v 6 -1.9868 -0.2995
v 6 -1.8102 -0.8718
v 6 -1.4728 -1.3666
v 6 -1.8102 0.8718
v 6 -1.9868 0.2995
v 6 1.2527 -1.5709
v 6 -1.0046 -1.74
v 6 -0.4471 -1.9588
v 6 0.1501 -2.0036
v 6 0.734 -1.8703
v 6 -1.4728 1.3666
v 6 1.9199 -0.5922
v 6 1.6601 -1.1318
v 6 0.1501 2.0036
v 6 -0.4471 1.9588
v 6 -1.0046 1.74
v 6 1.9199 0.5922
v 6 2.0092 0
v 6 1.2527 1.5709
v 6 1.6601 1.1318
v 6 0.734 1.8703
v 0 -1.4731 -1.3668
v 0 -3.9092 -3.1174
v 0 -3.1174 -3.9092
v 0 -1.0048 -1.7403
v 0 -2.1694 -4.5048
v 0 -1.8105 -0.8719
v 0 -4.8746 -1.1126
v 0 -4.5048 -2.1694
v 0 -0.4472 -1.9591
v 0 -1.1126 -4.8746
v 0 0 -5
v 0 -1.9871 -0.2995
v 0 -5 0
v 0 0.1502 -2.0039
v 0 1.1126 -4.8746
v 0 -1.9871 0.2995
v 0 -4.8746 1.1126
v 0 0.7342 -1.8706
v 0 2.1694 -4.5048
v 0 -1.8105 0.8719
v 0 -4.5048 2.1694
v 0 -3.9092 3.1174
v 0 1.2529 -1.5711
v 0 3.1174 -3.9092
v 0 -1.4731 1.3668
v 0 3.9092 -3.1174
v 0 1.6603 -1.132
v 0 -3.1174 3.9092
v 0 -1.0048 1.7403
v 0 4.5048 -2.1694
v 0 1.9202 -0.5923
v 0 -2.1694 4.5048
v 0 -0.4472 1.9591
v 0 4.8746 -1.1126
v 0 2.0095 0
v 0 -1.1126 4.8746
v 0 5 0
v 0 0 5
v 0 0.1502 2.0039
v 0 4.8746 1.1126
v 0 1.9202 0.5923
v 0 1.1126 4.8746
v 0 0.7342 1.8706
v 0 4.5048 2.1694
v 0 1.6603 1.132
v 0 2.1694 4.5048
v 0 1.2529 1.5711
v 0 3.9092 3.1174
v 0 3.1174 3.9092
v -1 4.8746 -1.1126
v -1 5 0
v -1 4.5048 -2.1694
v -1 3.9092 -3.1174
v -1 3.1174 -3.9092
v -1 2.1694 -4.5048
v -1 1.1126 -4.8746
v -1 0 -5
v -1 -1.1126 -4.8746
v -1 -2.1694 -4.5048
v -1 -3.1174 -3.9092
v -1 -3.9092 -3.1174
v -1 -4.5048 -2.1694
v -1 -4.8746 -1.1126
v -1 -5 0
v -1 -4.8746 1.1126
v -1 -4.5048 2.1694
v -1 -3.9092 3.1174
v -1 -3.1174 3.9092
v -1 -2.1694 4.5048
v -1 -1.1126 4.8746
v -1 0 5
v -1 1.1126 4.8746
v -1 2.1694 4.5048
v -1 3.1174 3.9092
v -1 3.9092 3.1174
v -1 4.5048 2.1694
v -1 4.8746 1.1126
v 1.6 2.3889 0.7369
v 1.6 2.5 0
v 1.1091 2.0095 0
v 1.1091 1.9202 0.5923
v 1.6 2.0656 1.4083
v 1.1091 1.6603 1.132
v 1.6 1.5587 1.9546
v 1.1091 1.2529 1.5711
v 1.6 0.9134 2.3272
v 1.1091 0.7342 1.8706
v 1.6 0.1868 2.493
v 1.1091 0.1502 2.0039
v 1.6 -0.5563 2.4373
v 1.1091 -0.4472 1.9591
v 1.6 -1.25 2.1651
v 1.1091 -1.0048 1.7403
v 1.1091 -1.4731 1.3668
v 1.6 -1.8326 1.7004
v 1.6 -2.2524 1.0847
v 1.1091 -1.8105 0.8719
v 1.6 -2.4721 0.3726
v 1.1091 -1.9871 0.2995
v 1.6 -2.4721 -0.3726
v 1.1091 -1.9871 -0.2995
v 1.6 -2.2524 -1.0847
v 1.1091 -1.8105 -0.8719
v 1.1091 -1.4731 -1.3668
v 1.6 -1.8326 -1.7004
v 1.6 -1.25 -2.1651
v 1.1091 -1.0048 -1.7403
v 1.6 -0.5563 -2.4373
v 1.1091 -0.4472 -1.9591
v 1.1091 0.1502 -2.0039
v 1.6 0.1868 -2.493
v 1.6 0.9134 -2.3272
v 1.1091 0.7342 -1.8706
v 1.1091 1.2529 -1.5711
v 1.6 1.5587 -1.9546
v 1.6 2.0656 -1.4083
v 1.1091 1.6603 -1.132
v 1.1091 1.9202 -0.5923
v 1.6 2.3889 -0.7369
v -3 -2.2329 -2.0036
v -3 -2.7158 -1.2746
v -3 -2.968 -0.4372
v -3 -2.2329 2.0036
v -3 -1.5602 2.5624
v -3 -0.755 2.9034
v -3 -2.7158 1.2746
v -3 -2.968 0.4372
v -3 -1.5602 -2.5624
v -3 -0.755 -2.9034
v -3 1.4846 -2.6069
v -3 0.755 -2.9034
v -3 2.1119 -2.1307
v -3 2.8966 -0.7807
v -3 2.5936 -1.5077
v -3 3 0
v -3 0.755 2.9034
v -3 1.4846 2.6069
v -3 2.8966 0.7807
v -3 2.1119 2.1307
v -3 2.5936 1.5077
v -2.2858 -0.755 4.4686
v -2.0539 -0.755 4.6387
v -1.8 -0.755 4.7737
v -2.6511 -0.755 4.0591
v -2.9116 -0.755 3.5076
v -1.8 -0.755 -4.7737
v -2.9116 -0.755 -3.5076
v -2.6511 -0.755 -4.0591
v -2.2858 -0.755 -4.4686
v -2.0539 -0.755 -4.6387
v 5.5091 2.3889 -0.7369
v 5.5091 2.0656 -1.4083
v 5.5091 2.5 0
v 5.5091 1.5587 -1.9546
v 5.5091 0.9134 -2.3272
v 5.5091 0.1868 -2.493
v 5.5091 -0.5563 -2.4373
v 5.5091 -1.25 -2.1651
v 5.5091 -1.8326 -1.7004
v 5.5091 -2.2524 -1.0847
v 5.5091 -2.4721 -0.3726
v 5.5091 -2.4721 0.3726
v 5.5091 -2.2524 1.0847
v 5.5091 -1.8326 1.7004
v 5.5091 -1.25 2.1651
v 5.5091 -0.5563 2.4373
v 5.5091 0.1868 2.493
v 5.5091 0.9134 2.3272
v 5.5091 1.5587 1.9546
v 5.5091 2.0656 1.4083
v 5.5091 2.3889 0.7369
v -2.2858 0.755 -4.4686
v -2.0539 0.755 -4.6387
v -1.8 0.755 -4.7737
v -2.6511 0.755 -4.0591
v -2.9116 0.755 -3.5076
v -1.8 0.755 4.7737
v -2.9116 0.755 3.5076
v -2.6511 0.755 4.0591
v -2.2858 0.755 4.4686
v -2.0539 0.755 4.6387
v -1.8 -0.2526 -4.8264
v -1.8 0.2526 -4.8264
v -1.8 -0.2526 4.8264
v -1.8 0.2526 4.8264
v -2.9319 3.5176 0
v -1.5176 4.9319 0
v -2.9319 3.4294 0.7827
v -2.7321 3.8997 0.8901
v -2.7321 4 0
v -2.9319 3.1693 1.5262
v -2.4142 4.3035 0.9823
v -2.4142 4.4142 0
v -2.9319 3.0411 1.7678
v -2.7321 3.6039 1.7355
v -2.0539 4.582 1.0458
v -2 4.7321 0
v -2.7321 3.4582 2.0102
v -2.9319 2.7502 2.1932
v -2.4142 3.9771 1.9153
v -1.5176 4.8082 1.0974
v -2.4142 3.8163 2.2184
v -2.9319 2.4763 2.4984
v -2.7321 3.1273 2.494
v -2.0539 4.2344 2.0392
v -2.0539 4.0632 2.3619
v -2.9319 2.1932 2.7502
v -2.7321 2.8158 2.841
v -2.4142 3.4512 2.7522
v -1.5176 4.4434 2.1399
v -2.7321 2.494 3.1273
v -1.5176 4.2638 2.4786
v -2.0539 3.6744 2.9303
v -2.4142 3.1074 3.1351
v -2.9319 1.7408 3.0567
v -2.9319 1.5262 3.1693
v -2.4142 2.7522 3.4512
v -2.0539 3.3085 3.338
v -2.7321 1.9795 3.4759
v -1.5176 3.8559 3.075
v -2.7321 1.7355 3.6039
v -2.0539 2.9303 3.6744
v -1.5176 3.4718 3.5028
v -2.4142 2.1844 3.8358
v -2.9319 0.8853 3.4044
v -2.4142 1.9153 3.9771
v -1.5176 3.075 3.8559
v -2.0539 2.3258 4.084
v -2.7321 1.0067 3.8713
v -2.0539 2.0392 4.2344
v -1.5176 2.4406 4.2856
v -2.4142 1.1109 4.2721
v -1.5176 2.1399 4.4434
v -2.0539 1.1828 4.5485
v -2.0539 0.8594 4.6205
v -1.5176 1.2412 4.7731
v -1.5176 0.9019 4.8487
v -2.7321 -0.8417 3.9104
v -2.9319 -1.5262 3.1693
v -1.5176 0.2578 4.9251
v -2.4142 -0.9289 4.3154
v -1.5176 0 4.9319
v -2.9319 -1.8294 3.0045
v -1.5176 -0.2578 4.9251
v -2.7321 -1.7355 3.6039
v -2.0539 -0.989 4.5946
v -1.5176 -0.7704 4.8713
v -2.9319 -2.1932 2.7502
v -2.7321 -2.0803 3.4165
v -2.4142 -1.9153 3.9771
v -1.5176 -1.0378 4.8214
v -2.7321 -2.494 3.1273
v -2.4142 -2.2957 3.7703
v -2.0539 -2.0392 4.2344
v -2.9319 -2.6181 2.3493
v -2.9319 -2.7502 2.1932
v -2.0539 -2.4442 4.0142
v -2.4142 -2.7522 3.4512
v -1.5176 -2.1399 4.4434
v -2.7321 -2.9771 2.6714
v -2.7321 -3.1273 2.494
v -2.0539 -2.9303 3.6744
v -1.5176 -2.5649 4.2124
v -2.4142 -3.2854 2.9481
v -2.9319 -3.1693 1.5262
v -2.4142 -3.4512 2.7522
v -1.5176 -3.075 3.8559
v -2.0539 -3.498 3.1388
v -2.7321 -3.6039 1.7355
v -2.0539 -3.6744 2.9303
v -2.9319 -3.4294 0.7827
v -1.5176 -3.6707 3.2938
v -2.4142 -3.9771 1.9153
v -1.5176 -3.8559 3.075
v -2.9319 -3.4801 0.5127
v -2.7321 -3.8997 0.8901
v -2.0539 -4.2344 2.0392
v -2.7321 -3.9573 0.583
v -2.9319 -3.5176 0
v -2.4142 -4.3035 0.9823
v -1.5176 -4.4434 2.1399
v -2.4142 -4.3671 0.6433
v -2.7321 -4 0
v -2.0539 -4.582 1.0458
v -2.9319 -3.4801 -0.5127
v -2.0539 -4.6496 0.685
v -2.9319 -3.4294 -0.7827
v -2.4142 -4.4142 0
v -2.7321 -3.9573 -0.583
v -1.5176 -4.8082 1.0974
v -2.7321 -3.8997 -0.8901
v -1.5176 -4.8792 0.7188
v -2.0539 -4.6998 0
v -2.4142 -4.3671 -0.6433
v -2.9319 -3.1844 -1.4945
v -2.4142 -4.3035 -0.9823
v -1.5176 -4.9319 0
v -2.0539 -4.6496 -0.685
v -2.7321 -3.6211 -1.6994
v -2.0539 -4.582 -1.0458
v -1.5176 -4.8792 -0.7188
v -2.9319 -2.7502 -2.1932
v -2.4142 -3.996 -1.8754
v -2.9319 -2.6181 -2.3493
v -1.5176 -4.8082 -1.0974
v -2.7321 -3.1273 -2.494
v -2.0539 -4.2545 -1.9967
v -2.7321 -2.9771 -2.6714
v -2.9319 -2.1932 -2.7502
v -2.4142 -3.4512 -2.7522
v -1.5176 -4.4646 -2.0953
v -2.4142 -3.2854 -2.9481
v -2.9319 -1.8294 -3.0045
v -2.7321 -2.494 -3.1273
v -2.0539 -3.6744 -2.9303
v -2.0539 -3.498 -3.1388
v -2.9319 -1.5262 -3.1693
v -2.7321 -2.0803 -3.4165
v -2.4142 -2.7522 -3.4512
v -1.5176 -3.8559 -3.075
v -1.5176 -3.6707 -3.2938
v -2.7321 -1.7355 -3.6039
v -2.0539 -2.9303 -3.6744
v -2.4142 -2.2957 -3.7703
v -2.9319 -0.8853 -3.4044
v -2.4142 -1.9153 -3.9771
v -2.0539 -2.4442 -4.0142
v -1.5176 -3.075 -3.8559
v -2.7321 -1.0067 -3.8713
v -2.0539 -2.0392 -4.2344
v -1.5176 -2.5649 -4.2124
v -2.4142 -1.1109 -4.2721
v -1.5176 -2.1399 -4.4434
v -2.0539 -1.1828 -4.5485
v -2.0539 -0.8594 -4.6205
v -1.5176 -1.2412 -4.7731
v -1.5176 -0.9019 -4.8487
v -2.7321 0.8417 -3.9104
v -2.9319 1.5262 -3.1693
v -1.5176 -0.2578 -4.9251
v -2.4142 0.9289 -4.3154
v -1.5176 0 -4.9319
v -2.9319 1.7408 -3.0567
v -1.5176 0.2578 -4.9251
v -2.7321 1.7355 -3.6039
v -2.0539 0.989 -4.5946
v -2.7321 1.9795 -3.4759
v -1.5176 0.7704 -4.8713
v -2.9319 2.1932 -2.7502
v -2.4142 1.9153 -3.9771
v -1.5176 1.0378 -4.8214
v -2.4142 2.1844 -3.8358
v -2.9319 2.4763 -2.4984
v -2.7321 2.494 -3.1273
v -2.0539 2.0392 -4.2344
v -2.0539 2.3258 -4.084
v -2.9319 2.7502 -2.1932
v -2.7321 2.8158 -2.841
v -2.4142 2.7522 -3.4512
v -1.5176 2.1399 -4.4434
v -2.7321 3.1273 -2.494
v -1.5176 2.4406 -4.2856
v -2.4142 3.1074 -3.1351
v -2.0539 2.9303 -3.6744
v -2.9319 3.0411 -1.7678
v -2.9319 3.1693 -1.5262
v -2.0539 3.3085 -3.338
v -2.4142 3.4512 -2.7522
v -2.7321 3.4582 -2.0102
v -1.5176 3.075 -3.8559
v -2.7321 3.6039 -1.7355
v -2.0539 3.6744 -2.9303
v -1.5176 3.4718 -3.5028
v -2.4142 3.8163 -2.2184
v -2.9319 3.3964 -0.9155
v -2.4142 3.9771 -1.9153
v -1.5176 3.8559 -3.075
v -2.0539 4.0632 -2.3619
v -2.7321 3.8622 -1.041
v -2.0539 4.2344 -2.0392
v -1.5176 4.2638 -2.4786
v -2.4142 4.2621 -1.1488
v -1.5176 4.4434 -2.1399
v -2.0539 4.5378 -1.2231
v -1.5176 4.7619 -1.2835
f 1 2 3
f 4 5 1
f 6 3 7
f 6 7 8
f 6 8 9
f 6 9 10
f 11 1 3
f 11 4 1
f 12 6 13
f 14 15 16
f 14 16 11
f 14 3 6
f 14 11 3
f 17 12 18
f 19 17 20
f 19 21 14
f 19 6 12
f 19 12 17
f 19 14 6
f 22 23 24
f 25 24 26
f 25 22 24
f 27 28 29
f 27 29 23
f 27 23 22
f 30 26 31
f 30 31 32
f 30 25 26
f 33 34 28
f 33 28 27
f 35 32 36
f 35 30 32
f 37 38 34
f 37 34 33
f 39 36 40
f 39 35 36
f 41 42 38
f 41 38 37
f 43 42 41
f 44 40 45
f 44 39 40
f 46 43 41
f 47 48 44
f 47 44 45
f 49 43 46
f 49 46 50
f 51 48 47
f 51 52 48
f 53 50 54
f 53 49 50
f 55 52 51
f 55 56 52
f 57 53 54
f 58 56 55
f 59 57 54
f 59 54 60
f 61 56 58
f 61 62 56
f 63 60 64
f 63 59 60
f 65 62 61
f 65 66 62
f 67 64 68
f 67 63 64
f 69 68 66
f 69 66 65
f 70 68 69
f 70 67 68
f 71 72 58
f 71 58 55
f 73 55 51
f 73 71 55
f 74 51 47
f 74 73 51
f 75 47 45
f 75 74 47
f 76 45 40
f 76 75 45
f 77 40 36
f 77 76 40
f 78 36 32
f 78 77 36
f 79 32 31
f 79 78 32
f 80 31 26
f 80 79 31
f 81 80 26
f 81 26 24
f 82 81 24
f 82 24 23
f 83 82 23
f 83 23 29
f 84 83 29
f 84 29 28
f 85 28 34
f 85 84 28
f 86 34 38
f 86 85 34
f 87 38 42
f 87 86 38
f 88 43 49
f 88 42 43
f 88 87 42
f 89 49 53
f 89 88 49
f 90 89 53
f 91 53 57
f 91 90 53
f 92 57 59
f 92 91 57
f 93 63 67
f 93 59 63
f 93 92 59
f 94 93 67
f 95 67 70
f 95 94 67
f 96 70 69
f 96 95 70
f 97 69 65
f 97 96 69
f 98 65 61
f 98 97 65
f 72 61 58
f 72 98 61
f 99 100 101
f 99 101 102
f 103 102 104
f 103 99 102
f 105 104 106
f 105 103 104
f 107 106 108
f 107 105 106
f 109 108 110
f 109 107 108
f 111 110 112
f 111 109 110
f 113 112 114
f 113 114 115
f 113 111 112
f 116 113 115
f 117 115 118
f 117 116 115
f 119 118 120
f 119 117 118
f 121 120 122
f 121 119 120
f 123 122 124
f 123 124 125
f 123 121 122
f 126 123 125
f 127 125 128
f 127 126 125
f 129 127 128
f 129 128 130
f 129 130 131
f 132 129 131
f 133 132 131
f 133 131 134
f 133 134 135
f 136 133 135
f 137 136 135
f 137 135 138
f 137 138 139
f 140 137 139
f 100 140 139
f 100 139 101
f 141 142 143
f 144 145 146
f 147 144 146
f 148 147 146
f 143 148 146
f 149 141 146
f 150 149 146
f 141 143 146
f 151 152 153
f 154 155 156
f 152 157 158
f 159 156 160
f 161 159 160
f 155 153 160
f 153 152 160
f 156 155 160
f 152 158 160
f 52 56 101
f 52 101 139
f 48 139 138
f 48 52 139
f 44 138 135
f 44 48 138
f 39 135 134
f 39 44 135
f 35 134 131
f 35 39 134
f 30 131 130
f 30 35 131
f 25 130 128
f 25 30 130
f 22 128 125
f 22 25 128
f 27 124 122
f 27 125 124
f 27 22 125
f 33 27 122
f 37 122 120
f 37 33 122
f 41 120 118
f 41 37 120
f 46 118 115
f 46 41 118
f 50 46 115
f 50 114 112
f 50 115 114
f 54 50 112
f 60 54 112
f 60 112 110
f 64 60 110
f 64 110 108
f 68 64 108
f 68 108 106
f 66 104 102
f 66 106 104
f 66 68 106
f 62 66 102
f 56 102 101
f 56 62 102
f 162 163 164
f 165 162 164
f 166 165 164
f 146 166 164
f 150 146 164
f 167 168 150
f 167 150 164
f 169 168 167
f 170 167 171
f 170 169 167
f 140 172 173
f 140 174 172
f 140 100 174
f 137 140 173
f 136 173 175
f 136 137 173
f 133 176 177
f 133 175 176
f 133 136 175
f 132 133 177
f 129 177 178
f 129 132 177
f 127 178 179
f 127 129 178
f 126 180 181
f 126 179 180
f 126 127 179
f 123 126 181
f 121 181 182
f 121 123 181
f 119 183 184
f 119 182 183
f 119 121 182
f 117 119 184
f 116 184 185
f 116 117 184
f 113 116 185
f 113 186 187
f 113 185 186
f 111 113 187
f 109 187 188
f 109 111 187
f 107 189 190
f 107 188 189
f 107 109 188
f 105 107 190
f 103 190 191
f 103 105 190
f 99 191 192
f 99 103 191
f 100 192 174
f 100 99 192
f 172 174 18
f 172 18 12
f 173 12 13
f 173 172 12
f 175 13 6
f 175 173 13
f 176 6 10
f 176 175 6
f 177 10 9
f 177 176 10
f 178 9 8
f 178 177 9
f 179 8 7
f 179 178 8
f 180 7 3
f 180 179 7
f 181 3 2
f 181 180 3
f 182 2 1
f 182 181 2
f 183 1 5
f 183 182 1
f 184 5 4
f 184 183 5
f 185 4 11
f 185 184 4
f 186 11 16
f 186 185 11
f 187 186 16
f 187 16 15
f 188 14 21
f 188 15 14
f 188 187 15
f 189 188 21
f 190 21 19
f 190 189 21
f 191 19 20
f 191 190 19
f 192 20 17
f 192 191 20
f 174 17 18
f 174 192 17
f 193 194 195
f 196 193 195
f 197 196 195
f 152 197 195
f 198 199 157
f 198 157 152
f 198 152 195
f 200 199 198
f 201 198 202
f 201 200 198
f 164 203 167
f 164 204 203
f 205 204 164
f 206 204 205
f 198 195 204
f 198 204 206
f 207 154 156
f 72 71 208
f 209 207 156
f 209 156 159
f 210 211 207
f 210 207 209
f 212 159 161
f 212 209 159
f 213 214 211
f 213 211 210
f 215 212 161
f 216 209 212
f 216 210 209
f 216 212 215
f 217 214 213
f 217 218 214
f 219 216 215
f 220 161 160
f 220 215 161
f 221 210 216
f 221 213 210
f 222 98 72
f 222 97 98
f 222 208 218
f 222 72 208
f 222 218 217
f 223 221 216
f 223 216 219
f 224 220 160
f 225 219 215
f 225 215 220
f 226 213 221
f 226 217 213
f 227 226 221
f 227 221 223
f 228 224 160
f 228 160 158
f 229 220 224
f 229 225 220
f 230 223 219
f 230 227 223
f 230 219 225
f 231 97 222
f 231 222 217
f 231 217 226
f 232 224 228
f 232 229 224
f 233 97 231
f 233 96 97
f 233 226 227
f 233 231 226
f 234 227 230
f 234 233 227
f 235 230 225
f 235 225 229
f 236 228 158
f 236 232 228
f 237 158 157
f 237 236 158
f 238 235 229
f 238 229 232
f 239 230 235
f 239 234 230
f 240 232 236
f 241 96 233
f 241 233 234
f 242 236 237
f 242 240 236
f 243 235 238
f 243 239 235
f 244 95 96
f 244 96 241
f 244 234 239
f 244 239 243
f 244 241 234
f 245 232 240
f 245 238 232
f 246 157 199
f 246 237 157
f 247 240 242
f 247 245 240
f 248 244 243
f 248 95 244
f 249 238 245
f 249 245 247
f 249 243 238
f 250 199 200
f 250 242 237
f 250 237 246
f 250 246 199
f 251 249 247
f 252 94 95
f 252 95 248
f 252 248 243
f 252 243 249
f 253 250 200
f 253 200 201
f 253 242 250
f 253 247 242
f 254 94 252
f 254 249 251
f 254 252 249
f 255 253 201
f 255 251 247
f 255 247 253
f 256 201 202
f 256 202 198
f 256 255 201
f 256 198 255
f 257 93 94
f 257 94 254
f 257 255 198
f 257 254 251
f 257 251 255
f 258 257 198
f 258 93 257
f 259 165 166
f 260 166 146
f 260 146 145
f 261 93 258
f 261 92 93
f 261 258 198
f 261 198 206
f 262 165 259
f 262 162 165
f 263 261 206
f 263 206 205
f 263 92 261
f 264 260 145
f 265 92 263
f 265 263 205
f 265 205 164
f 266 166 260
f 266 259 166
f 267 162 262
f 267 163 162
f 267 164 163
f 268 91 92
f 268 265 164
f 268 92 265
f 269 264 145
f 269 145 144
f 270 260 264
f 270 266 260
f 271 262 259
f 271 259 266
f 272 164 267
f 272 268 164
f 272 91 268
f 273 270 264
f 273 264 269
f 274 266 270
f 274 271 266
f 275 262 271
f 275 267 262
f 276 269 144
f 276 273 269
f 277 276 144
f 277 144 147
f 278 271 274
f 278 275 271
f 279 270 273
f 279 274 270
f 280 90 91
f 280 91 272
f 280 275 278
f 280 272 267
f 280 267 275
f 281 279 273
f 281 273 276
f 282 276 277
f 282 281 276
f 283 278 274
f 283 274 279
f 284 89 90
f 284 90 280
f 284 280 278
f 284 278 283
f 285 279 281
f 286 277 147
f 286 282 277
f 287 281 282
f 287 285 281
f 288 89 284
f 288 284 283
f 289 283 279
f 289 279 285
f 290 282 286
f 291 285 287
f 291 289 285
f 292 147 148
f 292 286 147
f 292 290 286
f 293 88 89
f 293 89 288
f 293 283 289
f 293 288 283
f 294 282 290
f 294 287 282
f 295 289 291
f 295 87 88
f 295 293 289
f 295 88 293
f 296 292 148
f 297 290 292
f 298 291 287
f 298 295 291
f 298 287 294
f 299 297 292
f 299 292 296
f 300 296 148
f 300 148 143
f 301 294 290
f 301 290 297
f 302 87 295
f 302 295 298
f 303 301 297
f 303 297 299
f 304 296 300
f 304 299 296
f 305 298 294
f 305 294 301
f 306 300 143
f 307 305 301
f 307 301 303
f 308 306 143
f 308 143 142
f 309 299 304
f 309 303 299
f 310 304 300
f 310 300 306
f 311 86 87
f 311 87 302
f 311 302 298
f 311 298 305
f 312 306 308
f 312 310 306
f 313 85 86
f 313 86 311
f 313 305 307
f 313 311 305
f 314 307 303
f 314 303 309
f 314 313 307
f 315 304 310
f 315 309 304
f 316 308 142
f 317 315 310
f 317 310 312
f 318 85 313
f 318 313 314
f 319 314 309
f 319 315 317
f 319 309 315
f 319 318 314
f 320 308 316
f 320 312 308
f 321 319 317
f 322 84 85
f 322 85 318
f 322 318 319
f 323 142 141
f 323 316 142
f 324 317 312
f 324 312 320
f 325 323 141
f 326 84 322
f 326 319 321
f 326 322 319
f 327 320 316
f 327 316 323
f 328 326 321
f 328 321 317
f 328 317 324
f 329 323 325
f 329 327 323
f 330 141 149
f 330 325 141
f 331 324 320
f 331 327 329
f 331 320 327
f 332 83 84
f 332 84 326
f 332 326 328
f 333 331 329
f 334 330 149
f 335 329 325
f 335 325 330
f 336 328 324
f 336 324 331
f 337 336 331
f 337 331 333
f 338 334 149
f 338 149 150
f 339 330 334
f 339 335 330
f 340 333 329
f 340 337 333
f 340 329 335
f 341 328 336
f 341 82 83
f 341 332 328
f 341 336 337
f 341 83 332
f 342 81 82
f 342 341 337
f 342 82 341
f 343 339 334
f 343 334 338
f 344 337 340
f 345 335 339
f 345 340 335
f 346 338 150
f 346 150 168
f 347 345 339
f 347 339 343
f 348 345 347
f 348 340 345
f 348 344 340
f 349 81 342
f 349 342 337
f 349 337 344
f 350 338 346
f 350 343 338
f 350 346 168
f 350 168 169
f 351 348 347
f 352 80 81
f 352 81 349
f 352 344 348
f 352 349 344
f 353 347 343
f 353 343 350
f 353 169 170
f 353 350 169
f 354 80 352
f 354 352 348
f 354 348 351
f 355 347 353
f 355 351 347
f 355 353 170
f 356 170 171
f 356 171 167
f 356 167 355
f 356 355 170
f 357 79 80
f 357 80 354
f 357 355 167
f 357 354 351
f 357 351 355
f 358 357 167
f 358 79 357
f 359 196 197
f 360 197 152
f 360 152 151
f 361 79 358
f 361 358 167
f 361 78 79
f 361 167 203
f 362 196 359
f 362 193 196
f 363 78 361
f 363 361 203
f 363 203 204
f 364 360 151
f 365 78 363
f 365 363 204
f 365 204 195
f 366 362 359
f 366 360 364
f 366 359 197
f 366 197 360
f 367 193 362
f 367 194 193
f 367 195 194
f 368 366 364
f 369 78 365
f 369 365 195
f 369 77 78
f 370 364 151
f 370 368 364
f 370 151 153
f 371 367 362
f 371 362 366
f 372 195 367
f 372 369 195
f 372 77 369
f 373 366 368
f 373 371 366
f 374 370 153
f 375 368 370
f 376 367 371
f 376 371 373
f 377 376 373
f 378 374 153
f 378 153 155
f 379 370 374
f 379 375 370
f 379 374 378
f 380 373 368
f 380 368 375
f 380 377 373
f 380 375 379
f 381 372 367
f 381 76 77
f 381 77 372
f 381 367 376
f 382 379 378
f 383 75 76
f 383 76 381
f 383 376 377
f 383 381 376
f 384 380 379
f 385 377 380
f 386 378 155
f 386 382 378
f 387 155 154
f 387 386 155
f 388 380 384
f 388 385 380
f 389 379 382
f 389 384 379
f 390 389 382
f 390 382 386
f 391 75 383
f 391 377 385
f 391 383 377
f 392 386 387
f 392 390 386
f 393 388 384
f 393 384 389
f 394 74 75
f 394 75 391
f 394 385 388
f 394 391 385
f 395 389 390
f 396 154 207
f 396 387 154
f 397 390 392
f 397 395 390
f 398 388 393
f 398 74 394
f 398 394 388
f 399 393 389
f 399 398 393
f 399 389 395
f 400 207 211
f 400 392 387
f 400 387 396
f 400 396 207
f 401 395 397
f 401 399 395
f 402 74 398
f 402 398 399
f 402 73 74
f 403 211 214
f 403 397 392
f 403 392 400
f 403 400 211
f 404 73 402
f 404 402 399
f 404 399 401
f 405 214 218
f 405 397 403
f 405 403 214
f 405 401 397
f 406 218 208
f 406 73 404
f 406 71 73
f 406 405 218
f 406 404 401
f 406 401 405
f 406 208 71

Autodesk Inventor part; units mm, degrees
ref_plane "YZ Plane" through (0, 0, 0) normal (1, 0, 0) x (0, 1, 0)
ref_plane "XZ Plane" through (0, 0, 0) normal (0, 1, 0) x (-1, 0, 0)
sketch "Sketch1" plane through (0, 0, 0) normal (0, 0, 1) x (1, 0, 0)
  line L0 (-3, 0) -> (6, 0)
  line L1 (6, 0) -> (6, 2.5)
  line L2 (6, 2.5) -> (1.6, 2.5)
  line L3 (1.6, 2.5) -> (1.1091, 2.0095)
  line L4 (1.1091, 2.0095) -> (0, 2.0095)
  line L5 (0, 2.0095) -> (0, 5)
  line L6 (-4.8, 0) -> (7.8, 0) projected
  line L7 (0, -1) -> (0, 6) projected
  line L8 (-3, 0) -> (-3, 4.9995)
  line L9 (0, 5) -> (-3, 4.9995)
  line L10 (1.6, 2.5) -> (0, 2.5) construction
  dimension "d0" = 6
  dimension "d1" = 4.4
  dimension "d2" = 0.4909
  dimension "d3" = 3
  dimension "d4" = 5
  dimension "d5" = 4.019
  dimension "d9" = 10
  dimension "d10" = 0.01
revolve "Body" add sketch "Sketch1" angle 360 about axis through (-3, 0, 0) along (1, 0, 0)
sketch "Sketch2" plane through (-3, 0, 0) normal (-1, 0, 0) x (0, 0, 1)
  circle A0 centre (0, 0) radius 5 projected
  line L0 (0, 0) -> (0, 4.9995) projected
  line L1 (-5, 0.755) -> (5, 0.755)
  line L2 (5, 0.755) -> (5, -0.755)
  line L3 (5, -0.755) -> (-5, -0.755)
  line L4 (-5, -0.755) -> (-5, 0.755)
  line L5 (-5, 0) -> (5, 0) construction
  line L6 (0, 0.755) -> (0, -0.755) construction
  dimension "d11" = 1.51
  dimension "d12" = 10
fillet "Fillet1" radius 2 1 edges at (-3, -4.9995, 0)
extrude "Slot" cut sketch "Sketch2" against normal blind 1.2 contours A0 L3 L1 | L2 L3 A0 | A0 L1 L2 | L3 L4 A0 | A0 L4 L1
thread "Thread" size "M5x0.8" class "6g" standard "ISO Metric profile" length 4.4
chamfer "Chamfer1" distance 0.4908 distance2 0.4909 1 edges at (6, -2.5, 0) measured on face at (6, -0.1451, 0.646)
ref_plane "Work Plane1" through (30.1625, 0, 0) normal (0, 0, -1) x (1, 0, 0)
equation "\"d11\" = SBR"
equation "\"d12\" = KOD"
equation "\"d14\" = RR"
equation "\"d19\" = STI"
equation "\"d15\" = GEL"
equation "\"d17\" = -0.5 * SPD + 0.5 * GD"
equation "\"d0\" = NLG"
equation "\"d1\" = GEL"
equation "\"d3\" = KOH"
equation "\"d4\" = GD"
equation "\"d5\" = BDM"
equation "\"d9\" = KOD"
equation "\"d10\" = KEWI"
equation "\"GD\" = NND"
equation "\"NLG\" = 6"
equation "\"GEL\" = 4.4"
equation "\"KOD\" = 10"
equation "\"KOH\" = 3"
equation "\"GAL\" = 0.61345 * PTC"
equation "\"SPD\" = NND - 1.2269 * PTC"
equation "\"BDM\" = 4.019"
equation "\"GUL\" = 0.61345 * PTC"
equation "\"RR\" = 2"
equation "\"SBR\" = 1.51"
equation "\"STI\" = 1.2"
equation "\"KEWI\" = 0.01deg"
equation "\"PTC\" = 0.8"
equation "\"THREADDIA\" = 5"
equation "\"TOA\" = 30deg"
equation "\"NND\" = 5"
equation "\"RR1\" = 0.35"
equation "\"GD1\" = THREADDIA - 1.2269 * PTC"
properties part number "AS 1427 - M5 x 6" material "Steel, Mild"
